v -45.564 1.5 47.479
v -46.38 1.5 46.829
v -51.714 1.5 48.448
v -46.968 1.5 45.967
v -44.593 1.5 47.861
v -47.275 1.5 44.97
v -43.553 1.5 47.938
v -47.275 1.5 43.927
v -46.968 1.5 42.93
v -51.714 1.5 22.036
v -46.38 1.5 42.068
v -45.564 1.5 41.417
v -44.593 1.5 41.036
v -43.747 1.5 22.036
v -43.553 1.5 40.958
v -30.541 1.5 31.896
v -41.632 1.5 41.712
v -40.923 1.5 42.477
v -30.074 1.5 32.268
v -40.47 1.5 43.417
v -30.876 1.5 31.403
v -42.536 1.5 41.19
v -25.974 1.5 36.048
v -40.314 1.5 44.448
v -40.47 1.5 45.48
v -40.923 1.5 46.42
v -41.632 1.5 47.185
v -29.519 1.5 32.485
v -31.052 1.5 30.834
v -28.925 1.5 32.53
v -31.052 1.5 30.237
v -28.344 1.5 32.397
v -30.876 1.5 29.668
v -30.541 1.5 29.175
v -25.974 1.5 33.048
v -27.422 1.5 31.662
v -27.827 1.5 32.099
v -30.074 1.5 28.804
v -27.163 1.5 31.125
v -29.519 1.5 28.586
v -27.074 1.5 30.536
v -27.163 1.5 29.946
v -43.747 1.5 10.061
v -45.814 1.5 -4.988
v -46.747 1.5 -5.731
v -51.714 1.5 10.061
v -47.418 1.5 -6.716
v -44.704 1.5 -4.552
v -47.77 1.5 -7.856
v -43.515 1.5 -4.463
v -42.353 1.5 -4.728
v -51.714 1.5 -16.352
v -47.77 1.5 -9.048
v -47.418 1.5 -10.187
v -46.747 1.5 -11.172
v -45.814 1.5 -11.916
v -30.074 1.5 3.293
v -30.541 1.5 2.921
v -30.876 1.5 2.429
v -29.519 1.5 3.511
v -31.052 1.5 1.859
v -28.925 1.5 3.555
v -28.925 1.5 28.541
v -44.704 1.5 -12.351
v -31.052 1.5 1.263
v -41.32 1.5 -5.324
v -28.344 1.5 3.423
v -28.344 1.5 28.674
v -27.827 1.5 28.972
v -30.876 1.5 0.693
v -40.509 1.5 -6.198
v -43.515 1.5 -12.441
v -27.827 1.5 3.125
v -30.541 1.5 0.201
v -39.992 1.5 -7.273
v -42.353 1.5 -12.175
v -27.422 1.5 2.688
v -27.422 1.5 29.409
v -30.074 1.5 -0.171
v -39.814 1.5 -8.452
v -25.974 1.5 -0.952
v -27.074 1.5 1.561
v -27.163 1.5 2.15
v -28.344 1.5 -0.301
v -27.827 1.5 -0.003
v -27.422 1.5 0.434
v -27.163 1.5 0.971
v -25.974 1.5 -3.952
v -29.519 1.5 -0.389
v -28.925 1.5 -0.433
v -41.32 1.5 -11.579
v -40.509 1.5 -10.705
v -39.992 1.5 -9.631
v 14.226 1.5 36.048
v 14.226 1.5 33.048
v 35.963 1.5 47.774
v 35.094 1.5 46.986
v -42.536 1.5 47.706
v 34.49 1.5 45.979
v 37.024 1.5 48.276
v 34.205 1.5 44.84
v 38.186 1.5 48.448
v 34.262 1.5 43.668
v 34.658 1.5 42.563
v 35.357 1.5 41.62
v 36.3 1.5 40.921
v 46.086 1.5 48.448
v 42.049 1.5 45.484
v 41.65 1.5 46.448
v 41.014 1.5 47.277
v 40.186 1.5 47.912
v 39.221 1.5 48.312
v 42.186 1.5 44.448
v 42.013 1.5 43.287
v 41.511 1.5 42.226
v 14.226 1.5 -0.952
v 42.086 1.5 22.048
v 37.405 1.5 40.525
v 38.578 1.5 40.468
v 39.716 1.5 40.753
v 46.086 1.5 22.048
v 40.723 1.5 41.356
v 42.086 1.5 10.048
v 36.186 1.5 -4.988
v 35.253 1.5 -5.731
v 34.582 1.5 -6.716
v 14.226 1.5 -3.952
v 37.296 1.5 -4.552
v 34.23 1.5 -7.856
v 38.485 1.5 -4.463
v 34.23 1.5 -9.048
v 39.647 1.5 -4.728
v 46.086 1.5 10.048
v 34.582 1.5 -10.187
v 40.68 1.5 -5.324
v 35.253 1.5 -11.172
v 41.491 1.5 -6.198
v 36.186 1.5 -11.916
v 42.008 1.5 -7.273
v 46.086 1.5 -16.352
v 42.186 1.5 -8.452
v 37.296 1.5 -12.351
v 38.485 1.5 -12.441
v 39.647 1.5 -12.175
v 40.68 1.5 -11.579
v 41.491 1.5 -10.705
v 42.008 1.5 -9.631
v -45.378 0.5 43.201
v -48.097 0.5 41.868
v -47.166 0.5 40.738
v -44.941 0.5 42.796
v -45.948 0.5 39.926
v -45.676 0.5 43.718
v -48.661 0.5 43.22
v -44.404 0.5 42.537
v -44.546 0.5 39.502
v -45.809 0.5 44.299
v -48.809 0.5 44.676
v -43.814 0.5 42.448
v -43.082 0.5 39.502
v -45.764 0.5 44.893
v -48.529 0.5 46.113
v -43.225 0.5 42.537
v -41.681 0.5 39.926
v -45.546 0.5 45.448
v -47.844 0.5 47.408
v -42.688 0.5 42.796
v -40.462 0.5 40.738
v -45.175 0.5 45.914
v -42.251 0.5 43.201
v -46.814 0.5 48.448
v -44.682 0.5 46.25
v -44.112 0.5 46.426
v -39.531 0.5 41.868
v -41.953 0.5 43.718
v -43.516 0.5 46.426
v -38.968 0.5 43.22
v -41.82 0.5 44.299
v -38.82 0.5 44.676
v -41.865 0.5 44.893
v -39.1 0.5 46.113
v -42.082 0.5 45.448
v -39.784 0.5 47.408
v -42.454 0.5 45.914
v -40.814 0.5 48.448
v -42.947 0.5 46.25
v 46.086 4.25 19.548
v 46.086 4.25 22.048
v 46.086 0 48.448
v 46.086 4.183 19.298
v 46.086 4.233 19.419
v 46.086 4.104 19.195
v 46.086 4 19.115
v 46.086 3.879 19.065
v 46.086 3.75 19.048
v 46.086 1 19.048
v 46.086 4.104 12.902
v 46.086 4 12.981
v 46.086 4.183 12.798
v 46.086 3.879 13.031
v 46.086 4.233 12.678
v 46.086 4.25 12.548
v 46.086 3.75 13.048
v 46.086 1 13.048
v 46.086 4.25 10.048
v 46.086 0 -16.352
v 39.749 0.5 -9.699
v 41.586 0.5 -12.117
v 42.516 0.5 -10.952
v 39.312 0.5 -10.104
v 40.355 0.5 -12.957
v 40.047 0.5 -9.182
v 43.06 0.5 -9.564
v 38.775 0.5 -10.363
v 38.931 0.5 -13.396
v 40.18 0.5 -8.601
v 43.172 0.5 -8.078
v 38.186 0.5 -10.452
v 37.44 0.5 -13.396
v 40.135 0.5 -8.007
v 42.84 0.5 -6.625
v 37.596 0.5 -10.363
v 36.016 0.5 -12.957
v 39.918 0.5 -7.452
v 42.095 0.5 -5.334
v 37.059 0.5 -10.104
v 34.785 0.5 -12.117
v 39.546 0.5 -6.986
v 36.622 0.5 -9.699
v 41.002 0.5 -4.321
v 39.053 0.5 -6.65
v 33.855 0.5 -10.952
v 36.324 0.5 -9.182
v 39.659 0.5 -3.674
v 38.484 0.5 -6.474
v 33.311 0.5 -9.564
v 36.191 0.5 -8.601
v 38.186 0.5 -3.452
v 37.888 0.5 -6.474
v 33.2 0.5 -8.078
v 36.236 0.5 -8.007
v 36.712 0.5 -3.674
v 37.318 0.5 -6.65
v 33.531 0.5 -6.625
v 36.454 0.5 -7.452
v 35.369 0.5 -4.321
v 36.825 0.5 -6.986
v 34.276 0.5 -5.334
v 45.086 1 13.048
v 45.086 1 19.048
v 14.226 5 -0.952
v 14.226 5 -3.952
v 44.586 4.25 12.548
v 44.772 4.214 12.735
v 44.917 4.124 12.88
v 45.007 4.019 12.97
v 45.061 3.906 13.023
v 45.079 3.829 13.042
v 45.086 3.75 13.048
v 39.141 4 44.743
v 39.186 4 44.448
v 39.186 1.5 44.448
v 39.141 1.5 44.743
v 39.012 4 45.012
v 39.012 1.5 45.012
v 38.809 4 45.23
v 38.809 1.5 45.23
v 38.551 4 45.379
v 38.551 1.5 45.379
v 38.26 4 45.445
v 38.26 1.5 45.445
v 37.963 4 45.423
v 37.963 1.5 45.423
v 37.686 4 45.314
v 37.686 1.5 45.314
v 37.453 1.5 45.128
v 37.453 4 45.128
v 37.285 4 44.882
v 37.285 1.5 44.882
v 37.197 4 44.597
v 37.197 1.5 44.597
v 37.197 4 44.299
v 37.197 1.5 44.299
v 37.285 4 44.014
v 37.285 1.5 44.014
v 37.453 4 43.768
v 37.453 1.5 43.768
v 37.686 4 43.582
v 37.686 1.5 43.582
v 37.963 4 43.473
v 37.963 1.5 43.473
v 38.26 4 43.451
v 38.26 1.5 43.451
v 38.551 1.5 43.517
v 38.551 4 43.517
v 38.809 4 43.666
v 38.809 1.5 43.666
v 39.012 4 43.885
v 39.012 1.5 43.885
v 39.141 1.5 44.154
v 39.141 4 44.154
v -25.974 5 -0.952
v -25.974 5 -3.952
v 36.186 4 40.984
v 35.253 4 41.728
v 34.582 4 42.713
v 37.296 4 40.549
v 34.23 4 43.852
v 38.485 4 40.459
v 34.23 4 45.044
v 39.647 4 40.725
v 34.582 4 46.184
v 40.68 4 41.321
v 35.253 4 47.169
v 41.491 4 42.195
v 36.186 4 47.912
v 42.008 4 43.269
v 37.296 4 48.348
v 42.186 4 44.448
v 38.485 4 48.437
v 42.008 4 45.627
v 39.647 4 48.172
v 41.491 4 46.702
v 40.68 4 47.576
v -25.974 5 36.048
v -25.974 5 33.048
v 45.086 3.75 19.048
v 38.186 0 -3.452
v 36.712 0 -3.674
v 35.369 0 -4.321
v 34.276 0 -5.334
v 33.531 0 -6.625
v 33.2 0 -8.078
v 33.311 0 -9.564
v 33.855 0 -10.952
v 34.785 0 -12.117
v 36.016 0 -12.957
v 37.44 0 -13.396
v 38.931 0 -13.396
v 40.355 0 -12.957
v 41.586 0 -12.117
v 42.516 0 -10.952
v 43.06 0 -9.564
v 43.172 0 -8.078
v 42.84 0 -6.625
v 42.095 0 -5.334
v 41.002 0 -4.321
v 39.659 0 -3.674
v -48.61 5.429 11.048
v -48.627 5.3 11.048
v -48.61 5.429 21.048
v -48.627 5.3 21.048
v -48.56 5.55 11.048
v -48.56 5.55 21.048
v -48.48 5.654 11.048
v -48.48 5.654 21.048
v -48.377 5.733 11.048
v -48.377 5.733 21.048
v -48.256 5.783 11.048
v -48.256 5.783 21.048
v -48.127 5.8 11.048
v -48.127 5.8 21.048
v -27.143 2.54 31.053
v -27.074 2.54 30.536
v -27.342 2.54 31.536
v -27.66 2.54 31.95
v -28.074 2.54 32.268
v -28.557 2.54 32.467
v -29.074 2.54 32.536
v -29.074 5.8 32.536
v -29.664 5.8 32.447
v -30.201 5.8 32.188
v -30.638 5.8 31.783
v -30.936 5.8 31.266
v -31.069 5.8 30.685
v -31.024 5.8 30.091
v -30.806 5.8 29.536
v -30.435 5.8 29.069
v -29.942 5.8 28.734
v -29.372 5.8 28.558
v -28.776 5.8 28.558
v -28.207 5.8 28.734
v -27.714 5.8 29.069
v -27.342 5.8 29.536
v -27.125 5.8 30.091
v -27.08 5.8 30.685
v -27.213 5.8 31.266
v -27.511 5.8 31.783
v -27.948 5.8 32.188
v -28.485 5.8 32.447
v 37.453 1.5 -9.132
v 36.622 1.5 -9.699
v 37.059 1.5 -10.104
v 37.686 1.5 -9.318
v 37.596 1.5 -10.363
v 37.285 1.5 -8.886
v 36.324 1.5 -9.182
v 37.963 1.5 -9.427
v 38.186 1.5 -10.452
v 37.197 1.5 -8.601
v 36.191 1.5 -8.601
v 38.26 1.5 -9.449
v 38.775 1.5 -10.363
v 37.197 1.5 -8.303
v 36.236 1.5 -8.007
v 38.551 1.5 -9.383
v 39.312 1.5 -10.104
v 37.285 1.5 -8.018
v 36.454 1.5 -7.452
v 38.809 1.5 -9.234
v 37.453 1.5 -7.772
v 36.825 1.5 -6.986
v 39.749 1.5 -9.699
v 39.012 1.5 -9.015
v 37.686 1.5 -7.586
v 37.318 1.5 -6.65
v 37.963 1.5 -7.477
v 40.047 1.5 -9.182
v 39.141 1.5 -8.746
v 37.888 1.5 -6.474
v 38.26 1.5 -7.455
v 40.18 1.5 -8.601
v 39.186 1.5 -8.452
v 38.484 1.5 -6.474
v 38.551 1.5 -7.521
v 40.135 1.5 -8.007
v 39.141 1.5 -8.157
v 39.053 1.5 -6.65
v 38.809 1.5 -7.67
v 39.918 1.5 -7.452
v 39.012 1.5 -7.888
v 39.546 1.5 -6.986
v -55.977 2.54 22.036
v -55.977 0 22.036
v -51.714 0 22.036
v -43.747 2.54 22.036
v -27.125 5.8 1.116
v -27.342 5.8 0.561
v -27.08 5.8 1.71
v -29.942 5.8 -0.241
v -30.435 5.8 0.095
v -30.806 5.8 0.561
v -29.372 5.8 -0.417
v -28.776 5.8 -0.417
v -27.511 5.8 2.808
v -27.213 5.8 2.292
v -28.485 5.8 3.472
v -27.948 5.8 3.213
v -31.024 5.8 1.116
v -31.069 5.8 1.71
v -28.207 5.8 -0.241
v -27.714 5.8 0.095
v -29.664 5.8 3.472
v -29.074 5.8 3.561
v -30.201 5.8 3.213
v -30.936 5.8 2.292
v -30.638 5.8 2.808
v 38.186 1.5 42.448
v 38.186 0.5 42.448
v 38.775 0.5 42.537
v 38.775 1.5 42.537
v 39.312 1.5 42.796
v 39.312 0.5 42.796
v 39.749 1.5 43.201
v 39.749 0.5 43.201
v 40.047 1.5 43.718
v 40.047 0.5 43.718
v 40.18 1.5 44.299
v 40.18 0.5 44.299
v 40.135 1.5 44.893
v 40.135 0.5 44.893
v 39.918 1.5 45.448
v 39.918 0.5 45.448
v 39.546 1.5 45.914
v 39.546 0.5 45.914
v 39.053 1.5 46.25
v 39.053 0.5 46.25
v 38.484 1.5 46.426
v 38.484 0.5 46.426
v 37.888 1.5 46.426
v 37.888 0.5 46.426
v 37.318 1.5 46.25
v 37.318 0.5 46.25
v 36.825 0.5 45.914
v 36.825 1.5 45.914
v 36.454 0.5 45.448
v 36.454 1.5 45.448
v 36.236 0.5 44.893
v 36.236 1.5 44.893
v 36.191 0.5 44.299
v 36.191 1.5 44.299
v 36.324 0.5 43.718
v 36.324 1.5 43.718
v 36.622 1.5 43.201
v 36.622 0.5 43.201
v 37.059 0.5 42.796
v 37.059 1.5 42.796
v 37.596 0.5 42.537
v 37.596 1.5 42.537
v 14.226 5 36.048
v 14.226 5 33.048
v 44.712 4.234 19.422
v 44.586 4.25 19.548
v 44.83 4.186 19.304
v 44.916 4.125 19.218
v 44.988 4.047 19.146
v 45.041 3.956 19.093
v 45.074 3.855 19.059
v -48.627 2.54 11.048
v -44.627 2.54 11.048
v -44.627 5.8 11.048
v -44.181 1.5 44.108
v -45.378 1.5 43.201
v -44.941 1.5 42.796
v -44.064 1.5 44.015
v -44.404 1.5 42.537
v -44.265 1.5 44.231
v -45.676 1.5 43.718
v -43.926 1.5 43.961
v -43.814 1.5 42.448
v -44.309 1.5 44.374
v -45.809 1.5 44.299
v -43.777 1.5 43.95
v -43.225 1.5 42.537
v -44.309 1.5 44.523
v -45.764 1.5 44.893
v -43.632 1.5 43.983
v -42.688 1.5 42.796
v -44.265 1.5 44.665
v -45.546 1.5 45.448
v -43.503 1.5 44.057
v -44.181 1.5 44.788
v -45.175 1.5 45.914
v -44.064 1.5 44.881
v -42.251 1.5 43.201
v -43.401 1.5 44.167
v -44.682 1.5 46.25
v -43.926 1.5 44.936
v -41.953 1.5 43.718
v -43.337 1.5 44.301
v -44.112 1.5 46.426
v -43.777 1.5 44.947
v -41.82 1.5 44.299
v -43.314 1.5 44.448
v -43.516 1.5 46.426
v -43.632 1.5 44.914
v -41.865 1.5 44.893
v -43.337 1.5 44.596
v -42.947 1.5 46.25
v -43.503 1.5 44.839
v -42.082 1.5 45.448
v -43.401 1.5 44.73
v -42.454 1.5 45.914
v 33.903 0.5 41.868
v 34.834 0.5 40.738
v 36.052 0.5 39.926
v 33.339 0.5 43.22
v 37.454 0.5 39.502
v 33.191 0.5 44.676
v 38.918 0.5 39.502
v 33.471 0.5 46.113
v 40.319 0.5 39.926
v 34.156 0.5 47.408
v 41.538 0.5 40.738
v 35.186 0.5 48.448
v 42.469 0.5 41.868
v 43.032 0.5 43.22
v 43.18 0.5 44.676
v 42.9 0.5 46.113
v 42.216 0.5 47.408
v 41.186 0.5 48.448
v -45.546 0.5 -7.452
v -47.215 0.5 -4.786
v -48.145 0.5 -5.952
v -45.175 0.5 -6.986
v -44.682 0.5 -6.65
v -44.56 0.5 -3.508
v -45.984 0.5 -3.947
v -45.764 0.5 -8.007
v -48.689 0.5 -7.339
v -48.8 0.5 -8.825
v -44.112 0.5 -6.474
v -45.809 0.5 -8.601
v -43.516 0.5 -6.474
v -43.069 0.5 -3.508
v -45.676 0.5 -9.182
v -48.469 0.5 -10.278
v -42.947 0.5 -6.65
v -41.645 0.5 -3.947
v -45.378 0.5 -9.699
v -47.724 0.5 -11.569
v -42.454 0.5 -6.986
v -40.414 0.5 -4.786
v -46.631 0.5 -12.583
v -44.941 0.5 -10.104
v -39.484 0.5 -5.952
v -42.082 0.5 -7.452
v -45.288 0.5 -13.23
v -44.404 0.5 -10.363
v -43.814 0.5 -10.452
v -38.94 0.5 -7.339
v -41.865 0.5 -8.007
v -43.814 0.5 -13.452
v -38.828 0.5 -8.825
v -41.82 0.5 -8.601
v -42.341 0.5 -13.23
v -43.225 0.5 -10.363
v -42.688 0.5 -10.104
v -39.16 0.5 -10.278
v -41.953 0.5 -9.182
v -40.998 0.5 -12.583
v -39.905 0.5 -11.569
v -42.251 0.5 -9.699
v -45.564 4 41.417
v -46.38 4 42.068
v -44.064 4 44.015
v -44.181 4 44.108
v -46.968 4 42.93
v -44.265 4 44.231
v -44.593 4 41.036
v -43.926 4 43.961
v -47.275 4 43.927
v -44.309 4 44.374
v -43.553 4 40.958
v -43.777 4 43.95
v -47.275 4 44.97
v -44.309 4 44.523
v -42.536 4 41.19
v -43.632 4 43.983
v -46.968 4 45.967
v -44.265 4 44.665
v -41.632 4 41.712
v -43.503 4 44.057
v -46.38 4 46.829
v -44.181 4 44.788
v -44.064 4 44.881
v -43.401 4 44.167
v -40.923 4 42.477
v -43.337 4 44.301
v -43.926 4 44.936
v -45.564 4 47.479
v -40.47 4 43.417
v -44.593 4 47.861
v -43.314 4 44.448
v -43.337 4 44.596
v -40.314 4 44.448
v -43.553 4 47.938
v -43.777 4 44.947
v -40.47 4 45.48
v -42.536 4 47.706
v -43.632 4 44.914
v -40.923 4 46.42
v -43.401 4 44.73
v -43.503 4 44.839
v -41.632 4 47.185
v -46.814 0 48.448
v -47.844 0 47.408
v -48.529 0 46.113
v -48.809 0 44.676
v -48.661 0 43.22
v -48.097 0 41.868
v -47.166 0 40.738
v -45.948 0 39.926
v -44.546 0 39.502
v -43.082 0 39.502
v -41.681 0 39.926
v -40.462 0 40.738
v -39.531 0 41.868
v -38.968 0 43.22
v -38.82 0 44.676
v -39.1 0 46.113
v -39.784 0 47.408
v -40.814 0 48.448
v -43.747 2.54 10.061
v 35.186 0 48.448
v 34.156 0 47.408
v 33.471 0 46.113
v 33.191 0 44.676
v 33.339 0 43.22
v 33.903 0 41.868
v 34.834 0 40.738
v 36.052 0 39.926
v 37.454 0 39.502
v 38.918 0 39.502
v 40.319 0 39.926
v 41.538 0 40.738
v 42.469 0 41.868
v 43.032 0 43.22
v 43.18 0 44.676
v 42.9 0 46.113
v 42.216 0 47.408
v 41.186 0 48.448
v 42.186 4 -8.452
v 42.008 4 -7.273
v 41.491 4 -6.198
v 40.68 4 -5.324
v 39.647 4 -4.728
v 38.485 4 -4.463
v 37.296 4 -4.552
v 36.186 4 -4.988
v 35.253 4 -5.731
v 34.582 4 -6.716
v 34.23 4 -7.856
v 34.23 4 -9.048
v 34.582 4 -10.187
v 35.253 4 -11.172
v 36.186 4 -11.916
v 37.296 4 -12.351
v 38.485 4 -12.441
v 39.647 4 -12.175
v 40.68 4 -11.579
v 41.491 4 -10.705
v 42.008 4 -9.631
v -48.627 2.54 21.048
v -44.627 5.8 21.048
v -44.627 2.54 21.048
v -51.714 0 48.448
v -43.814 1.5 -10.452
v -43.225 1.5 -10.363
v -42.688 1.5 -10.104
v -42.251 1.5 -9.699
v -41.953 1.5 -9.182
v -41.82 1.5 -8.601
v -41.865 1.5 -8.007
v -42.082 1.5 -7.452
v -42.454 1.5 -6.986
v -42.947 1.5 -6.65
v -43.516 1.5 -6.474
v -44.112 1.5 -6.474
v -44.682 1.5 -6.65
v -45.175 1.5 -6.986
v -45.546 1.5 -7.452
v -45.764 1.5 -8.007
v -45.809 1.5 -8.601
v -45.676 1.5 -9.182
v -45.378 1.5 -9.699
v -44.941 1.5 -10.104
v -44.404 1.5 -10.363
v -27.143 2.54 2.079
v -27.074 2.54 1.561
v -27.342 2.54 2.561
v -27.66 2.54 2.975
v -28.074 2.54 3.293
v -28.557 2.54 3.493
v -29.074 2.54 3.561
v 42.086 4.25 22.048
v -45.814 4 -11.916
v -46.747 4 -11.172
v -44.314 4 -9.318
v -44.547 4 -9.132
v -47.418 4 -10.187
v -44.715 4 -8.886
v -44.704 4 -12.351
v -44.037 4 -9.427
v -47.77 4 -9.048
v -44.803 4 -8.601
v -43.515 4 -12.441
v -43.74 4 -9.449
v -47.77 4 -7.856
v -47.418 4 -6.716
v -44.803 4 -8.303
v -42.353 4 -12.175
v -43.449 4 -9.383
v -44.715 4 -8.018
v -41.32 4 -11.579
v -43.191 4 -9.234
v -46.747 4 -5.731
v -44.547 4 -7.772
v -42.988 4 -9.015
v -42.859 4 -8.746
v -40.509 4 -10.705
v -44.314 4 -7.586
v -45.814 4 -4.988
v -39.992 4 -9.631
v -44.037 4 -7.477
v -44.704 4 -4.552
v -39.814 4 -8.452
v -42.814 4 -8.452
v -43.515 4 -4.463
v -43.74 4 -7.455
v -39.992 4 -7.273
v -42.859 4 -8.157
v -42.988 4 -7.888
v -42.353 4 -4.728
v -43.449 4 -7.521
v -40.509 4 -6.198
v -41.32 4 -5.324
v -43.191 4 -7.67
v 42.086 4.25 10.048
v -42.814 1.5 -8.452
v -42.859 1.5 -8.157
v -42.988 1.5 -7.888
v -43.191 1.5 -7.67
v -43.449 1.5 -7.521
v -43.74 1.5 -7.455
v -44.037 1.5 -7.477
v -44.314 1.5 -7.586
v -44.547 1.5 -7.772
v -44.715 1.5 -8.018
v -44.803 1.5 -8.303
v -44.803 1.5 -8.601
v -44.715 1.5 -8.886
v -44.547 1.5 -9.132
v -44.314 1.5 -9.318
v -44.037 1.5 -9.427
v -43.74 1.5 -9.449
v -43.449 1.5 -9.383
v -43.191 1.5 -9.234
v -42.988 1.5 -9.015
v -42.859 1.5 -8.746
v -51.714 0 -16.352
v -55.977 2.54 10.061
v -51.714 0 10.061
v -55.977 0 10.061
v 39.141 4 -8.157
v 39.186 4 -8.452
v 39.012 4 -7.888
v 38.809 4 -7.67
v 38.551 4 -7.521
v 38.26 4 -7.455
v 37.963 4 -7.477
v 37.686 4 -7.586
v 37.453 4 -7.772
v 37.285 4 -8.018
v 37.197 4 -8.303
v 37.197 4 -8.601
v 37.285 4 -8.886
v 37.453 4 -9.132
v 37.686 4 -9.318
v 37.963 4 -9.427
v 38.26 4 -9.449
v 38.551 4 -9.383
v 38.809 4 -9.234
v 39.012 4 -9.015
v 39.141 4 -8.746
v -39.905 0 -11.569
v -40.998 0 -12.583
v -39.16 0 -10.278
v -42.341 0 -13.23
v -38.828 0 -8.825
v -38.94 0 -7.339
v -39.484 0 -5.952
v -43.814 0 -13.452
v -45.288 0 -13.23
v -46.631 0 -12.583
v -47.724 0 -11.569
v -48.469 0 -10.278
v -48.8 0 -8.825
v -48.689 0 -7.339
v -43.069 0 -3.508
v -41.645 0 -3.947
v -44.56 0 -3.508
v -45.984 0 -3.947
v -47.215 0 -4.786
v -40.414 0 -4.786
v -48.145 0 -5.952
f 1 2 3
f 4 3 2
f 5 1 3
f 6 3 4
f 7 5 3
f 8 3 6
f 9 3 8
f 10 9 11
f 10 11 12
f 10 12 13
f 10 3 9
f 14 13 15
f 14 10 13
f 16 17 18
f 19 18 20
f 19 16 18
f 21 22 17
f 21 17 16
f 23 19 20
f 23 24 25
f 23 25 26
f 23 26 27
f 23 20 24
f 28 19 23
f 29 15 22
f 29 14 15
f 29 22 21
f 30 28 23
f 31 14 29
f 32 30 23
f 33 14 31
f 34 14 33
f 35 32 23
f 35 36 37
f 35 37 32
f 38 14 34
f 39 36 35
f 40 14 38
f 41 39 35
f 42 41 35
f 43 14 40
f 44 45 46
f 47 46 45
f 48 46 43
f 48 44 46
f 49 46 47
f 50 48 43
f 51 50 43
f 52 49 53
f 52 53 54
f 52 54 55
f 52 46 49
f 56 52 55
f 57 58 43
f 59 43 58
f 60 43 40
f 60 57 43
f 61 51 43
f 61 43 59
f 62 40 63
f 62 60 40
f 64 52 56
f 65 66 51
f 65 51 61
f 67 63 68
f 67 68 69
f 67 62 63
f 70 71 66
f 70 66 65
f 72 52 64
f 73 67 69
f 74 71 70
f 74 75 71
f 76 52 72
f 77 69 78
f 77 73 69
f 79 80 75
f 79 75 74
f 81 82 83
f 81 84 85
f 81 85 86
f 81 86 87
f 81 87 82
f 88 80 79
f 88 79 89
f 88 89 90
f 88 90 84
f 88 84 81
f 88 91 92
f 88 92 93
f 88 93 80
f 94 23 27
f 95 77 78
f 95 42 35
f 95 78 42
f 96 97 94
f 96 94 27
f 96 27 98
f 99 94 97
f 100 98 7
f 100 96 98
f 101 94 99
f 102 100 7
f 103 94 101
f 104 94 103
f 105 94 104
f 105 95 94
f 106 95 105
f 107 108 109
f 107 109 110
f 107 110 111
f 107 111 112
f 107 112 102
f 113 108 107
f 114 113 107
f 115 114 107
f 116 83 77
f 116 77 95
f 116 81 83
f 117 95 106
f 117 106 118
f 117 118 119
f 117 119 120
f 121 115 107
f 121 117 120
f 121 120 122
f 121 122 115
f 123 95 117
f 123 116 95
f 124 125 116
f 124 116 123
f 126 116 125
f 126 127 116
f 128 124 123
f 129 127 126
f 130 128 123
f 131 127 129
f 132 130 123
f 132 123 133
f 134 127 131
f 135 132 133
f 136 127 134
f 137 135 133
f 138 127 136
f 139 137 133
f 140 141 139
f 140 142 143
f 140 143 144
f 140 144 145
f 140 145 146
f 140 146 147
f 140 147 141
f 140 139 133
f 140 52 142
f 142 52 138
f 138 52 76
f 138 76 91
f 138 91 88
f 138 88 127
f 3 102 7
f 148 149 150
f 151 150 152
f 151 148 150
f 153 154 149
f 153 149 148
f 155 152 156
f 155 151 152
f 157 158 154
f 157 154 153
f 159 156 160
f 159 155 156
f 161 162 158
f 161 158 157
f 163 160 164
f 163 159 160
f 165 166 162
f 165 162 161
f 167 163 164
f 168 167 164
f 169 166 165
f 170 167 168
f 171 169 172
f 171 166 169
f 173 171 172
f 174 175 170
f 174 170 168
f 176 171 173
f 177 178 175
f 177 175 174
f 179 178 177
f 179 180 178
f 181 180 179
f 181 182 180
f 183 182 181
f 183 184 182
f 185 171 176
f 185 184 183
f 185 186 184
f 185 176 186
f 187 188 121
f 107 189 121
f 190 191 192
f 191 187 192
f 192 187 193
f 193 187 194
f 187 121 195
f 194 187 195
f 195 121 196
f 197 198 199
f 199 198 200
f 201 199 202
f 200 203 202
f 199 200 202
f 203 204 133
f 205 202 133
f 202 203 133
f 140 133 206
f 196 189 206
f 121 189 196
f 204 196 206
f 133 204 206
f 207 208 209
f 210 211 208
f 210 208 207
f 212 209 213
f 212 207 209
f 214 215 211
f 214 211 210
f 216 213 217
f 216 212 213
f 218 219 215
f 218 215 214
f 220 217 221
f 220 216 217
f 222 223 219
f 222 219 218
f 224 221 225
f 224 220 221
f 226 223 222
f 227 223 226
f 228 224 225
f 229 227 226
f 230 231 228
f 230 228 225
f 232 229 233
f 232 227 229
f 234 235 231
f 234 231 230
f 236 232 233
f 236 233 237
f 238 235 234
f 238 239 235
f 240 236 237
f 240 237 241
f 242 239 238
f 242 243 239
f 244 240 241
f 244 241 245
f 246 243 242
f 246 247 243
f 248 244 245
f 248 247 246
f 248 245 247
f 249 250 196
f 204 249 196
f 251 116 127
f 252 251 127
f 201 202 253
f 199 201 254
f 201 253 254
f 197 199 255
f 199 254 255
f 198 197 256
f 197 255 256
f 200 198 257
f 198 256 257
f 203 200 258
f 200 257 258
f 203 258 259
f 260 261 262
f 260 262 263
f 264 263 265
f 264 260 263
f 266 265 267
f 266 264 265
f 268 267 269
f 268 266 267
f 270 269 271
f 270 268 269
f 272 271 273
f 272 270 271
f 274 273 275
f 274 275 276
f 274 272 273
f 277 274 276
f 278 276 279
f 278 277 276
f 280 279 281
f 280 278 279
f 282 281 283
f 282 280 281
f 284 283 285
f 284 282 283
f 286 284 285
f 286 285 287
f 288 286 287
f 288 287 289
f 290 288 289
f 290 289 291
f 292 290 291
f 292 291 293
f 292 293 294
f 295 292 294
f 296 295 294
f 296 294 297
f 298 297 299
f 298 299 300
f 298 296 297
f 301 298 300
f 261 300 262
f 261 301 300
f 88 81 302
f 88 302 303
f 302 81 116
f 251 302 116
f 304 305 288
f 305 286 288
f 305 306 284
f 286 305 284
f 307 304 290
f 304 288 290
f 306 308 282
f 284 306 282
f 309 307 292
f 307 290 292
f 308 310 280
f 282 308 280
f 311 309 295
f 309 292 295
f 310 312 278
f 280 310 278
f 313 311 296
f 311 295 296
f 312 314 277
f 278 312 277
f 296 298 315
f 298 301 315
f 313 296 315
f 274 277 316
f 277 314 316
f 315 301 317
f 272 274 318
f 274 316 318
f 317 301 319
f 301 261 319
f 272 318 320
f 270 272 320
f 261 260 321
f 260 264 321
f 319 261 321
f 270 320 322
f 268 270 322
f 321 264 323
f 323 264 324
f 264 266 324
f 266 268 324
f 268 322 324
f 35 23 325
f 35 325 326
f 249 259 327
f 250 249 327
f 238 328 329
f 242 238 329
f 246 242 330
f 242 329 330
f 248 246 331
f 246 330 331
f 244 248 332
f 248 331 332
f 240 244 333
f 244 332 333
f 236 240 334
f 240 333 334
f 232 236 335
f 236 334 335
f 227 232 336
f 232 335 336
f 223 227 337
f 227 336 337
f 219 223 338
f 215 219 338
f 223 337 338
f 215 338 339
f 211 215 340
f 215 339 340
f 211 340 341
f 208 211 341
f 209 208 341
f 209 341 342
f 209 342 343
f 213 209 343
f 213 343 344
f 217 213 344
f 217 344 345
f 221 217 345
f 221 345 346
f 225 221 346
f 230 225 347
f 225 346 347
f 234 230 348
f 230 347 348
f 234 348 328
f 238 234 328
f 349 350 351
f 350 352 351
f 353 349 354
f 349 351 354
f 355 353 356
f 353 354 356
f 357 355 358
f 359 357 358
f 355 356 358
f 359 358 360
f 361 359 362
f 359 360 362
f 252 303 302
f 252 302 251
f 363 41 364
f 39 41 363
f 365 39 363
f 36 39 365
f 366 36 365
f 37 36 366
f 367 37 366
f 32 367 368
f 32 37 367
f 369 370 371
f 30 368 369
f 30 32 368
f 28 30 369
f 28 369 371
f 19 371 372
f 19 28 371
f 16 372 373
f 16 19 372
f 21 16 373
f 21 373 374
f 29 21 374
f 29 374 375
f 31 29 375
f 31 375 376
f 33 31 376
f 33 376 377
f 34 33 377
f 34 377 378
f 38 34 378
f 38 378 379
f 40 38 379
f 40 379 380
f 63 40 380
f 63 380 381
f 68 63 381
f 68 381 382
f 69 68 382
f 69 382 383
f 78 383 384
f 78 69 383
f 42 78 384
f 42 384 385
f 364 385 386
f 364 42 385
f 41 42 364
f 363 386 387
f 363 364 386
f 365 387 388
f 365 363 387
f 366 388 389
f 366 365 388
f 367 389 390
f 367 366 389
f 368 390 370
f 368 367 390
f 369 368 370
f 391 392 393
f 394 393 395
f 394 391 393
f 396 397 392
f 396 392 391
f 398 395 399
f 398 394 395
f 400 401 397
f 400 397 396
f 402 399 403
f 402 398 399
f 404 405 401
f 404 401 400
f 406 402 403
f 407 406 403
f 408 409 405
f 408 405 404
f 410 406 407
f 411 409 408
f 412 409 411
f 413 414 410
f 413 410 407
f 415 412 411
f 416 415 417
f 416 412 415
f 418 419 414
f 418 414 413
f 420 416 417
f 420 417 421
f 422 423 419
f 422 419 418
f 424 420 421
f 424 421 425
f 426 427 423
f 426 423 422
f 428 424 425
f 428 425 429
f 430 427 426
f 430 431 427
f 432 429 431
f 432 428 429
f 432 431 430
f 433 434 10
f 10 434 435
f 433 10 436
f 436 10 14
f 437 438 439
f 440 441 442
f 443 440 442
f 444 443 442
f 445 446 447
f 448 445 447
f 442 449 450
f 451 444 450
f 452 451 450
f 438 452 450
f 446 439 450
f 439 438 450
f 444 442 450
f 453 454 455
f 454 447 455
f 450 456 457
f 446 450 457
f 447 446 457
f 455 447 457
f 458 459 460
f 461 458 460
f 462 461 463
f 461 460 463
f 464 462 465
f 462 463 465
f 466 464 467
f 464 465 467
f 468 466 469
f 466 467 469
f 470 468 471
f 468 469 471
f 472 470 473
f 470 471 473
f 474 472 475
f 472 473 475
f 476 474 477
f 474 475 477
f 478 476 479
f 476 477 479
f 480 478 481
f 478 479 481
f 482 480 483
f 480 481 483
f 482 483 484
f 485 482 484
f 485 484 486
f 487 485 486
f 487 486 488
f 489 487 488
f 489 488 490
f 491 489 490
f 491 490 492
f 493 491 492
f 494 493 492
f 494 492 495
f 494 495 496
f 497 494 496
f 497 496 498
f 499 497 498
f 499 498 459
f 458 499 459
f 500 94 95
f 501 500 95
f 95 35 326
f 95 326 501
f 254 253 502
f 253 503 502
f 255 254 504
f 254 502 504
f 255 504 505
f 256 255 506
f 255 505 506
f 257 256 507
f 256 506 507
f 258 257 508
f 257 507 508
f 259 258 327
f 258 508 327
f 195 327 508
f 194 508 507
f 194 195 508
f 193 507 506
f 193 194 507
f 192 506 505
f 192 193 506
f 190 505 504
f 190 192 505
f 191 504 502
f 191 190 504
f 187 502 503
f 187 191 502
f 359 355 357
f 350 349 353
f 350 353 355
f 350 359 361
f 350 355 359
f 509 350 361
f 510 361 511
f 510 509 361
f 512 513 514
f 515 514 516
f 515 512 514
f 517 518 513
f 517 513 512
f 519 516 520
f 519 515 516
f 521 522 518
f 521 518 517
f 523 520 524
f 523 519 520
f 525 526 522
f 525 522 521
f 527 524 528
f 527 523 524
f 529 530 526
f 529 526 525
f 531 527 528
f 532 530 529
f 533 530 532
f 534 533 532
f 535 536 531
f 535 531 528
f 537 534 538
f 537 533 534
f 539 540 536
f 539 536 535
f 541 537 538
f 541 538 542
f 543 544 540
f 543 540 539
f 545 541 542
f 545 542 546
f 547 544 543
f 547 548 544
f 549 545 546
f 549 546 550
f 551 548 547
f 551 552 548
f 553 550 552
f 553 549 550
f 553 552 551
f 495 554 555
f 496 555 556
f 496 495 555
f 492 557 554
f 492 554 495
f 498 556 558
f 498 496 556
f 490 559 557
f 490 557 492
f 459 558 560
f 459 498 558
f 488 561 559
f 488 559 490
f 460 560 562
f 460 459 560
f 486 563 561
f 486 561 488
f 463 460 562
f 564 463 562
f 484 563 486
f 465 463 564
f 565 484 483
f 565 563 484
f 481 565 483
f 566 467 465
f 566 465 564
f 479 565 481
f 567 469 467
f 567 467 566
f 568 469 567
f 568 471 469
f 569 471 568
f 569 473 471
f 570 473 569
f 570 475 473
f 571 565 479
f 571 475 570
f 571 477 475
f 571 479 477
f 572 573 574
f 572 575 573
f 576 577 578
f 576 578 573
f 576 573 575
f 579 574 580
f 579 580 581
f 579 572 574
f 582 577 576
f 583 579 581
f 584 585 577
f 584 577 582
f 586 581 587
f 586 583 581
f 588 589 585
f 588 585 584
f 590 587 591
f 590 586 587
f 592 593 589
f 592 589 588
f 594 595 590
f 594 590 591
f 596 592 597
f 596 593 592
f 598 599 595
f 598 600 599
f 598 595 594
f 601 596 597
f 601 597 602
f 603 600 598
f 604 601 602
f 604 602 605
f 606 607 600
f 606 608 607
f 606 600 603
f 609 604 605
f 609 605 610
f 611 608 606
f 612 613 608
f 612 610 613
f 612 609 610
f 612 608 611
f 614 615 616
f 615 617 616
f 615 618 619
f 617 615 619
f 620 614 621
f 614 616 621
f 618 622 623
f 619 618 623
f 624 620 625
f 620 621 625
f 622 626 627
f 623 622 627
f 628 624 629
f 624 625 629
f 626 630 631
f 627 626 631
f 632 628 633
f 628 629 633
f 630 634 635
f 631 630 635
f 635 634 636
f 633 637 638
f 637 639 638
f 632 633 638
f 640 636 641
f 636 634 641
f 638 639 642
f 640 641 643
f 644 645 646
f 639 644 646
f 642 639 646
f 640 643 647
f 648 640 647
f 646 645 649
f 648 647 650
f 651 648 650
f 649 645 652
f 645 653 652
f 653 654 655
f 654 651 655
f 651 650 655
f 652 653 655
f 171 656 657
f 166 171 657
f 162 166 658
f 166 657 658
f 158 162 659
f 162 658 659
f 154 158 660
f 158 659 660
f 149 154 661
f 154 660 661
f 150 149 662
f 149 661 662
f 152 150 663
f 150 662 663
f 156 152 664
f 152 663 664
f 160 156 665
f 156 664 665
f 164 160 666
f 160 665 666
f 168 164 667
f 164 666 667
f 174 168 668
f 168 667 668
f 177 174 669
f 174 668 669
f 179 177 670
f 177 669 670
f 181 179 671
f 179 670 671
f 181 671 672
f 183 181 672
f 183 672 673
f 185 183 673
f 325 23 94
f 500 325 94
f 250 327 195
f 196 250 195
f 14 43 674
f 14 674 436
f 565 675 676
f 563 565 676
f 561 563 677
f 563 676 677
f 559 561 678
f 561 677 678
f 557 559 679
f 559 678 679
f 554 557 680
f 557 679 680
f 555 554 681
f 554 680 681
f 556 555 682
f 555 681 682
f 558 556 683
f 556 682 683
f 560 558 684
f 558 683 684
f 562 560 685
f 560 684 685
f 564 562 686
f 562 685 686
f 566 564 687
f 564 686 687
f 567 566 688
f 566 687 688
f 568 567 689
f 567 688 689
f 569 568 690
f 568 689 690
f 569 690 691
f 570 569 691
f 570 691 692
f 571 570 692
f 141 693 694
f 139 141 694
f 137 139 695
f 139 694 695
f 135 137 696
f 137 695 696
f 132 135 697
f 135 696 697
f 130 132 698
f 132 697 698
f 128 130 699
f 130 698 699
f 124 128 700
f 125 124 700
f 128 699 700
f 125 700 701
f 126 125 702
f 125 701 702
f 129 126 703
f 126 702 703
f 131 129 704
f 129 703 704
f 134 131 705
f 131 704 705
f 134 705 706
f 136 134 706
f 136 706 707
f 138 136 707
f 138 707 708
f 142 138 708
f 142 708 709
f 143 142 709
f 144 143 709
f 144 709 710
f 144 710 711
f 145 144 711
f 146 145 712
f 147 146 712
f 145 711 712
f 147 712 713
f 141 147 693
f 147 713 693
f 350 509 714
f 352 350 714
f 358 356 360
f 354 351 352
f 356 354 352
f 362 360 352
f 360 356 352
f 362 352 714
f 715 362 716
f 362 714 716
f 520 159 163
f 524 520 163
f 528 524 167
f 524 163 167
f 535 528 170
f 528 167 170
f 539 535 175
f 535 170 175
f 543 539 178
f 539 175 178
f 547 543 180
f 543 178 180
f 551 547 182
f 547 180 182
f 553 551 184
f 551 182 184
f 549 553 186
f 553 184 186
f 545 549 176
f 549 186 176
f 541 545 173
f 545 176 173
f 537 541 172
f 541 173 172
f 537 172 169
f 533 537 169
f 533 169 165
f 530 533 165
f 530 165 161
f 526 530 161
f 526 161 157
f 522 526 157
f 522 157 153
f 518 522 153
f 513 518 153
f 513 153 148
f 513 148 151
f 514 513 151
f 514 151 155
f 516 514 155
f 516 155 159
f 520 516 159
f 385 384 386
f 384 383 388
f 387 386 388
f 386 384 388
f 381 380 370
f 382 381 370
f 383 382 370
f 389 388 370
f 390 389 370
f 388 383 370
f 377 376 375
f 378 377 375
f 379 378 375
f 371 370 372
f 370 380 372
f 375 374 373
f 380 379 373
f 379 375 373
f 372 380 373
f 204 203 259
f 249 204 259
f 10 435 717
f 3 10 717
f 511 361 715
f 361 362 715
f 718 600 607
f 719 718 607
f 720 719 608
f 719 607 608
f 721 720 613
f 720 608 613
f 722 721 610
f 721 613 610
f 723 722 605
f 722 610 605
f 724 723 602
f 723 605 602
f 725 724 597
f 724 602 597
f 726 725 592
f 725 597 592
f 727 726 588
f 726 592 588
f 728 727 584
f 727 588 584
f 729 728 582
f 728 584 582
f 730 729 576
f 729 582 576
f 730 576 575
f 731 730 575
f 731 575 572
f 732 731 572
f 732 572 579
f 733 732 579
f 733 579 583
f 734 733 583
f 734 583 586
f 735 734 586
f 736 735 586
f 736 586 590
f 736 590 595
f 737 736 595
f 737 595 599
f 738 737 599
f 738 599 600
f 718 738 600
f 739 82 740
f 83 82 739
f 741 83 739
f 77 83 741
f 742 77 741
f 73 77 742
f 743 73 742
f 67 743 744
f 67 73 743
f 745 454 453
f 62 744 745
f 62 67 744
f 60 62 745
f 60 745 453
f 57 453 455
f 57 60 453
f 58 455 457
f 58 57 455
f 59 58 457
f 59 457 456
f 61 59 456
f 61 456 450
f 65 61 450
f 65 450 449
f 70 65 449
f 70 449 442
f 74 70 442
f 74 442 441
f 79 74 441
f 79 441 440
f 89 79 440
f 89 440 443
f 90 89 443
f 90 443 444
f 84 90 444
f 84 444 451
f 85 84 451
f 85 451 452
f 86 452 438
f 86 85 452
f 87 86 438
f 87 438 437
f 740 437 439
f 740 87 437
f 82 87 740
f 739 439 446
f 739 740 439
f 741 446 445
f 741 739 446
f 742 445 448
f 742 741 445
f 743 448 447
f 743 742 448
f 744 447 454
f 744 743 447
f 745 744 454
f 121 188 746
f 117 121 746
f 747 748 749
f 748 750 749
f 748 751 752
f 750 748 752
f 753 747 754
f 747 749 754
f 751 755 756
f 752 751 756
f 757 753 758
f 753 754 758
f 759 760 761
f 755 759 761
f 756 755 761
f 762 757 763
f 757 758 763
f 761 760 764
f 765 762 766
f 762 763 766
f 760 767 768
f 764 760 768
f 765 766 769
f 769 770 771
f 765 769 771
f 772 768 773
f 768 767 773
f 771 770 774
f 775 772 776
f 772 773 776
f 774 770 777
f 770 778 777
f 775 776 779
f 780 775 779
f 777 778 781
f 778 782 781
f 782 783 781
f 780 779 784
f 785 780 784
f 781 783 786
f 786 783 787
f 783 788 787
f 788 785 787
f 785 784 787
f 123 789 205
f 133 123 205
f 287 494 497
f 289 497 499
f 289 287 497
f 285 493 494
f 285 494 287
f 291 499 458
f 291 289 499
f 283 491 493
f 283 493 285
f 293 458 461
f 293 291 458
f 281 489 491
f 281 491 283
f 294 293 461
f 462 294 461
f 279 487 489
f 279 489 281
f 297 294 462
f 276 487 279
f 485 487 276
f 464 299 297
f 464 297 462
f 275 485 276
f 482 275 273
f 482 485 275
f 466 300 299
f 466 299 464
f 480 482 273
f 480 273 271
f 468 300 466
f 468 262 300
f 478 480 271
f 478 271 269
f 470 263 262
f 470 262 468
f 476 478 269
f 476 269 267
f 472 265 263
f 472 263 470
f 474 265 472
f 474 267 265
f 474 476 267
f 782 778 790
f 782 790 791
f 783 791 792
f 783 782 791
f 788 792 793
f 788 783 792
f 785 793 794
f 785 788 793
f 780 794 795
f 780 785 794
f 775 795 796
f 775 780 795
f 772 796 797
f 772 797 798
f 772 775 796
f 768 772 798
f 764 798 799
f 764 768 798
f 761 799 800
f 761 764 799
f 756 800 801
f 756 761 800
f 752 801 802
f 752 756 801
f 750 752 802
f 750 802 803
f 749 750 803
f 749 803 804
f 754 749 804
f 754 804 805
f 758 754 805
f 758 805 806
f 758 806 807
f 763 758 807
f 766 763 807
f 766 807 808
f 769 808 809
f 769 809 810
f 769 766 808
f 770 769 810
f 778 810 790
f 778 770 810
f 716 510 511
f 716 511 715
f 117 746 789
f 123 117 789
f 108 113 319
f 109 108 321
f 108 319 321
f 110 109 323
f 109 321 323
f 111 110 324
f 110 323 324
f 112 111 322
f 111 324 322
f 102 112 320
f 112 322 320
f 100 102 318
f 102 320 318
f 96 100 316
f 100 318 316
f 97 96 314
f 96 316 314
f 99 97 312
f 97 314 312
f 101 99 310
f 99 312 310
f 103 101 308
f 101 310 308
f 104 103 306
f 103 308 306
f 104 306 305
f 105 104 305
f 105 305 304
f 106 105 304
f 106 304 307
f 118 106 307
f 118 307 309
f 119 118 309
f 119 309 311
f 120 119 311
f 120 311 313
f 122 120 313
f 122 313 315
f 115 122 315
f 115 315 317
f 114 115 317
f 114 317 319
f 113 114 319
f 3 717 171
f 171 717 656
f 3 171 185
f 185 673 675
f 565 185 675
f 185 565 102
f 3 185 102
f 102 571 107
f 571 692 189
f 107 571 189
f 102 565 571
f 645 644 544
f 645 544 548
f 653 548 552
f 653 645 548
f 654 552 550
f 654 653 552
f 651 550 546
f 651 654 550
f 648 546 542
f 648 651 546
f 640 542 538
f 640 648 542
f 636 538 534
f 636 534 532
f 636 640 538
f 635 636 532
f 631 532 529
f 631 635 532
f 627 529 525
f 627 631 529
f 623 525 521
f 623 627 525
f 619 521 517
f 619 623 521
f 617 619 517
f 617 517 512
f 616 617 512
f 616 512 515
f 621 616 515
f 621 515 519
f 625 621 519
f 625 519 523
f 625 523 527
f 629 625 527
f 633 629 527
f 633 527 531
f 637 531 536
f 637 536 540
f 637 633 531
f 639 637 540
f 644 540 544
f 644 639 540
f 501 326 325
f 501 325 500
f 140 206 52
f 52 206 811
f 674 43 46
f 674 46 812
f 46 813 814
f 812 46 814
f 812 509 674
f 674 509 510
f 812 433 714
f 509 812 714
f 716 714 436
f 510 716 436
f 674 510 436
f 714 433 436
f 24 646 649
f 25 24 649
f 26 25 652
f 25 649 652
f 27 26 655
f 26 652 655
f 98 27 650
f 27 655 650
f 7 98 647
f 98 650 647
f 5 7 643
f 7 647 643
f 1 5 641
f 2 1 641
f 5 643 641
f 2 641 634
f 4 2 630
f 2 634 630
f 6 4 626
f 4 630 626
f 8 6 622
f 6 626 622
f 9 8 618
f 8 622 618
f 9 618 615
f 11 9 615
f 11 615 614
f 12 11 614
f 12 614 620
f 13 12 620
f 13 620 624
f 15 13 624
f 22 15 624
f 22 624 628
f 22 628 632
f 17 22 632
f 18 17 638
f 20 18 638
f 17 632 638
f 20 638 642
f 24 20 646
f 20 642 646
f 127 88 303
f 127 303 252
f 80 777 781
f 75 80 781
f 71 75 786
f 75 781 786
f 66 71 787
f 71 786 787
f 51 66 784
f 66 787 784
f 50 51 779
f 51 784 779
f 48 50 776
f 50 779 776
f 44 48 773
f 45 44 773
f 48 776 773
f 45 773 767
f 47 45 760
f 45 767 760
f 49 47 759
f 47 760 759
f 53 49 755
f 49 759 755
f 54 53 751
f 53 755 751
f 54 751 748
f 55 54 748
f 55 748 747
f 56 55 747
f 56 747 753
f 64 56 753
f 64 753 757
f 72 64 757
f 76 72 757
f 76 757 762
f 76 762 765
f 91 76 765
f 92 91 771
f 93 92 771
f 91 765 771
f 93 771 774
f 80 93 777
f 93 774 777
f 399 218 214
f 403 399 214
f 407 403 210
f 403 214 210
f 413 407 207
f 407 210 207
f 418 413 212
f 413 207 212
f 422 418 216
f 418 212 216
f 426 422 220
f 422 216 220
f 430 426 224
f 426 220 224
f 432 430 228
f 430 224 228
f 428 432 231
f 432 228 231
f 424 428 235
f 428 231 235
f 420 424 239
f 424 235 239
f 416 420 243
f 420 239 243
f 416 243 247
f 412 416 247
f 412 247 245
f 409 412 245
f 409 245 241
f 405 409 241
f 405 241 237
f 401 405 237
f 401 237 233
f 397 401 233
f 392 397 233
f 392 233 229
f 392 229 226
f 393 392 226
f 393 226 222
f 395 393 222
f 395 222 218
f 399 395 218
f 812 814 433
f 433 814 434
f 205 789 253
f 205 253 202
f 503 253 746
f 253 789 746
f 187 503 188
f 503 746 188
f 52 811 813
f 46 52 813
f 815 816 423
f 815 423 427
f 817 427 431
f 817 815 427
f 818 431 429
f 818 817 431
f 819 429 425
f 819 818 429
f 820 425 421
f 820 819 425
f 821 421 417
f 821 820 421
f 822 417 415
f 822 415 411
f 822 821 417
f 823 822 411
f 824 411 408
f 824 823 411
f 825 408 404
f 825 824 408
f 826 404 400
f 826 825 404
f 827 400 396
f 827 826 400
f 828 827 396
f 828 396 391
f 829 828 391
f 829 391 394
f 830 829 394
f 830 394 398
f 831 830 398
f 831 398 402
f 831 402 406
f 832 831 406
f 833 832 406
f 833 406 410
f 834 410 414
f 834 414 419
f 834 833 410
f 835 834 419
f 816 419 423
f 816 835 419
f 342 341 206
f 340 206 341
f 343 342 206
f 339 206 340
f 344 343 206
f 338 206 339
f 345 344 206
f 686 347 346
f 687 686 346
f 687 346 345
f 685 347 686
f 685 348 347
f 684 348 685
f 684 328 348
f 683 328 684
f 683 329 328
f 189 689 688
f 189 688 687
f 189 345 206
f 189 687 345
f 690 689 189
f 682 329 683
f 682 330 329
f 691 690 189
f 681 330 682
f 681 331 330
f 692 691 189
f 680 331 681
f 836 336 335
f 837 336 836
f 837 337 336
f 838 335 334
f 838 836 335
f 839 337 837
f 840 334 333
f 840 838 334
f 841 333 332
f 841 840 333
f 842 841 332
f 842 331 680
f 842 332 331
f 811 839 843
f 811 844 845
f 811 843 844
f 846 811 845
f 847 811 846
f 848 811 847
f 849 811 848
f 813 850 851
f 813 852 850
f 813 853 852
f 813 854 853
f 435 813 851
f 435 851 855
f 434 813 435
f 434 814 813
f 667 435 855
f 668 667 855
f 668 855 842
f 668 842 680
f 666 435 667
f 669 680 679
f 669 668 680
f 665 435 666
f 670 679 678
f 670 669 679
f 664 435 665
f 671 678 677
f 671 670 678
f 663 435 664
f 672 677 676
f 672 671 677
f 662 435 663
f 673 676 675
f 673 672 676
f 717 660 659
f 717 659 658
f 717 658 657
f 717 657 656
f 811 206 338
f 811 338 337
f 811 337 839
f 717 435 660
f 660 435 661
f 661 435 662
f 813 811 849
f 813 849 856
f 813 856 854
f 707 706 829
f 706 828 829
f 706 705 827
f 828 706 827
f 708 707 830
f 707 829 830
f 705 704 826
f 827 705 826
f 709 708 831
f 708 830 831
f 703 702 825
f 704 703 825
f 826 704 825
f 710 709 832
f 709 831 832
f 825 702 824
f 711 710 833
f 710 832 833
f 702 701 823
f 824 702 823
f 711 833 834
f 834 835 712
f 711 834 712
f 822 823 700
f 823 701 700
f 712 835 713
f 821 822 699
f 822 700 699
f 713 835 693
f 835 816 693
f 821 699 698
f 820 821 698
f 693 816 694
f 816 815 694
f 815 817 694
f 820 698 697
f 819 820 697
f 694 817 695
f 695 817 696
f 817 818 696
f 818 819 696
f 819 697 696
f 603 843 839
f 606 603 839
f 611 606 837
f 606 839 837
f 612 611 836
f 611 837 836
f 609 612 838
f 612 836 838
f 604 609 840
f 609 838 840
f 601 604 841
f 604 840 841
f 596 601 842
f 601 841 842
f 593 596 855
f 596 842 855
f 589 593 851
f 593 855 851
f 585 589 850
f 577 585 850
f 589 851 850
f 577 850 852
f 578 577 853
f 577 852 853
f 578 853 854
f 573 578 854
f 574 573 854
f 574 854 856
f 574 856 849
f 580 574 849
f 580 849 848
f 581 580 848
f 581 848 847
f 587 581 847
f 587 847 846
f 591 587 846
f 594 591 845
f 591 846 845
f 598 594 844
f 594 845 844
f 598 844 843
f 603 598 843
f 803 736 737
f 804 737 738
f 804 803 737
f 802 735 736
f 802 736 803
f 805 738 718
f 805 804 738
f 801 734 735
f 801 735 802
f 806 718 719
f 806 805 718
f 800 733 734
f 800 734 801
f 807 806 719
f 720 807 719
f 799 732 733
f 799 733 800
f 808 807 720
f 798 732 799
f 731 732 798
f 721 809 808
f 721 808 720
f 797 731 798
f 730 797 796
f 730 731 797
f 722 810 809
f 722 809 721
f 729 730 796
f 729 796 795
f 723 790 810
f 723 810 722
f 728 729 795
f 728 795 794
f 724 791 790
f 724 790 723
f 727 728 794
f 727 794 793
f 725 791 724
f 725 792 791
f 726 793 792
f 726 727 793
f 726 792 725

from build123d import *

# Parameters (mm, degrees)
EXTRUDE_1_DEPTH     = 1.5
SKETCH_2_R          = 5
CUT_EXTRUDE_1_DEPTH = 0.5
SKETCH_11_R         = 2
SKETCH_11_W         = 12.230000074
SKETCH_11_H         = 11.97459995
EXTRUDE_5_DEPTH     = 2.539974634
SKETCH_13_R         = 2
SKETCH_13_W         = 4
SKETCH_13_H         = 10
TYPEC_2_DEPTH       = 5.7999746
LED_3_START         = -4.25
LED_3_DEPTH         = 2.75
LED_1_R             = 0.5
CUT_EXTRUDE_2_REACH = 76.258
SKETCH_15_R         = 2
EXTRUDE_START       = -4
SKETCH_16_R         = 4
SKETCH_16_R_2       = 1
SKETCH_16_R_3       = 3.5
SKETCH_16_R_4       = 0.5
EXTRUDE_4_DEPTH     = 2.5
LED_2_START         = -1.5
SKETCH_17_W         = 1
SKETCH_17_H         = 6
LED_2_DEPTH         = 0.5
SKETCH_18_W         = 40.2
SKETCH_18_H         = 3
EXTRUDE_2_DEPTH     = 3.5


with BuildPart() as part:
    # 草图1 → 凸台-拉伸1 (new body)
    with BuildSketch(Plane(origin=(0, 0, 0), x_dir=(1, 0, 0), z_dir=(0, 1, 0))):
        Polygon((-51.714401711, -10.060969859), (-55.976720774, -10.060969859), (-55.976720774, -22.035569809), (-51.714401711, -22.035569809), (-51.714401711, -48.448269834), (46.085598289, -48.448269834), (46.085598289, 16.351730166), (-51.714401711, 16.351730166), align=None)
    extrude(amount=EXTRUDE_1_DEPTH)

    # 草图2 → 防滑切除-拉伸1 (cut)
    with BuildSketch(Plane.XZ):
        with Locations((-43.814401711, 44.448269834)):
            Circle(SKETCH_2_R)
        with Locations((38.185598289, 44.448269834)):
            Circle(SKETCH_2_R)
        with Locations(Location((38.185598289, -8.451730166, 0), (0, 0, 90))):
            Circle(SKETCH_2_R)
        with Locations(Location((-43.814401711, -8.451730166, 0), (0, 0, 270))):
            Circle(SKETCH_2_R)
    extrude(amount=-CUT_EXTRUDE_1_DEPTH, mode=Mode.SUBTRACT)

    # 草图11 → 充电板档板凸台-拉伸5 (add)
    with BuildSketch(Plane.XZ):
        with Locations((-29.074401711, 30.535569809)):
            Circle(SKETCH_11_R)
        with Locations((-29.074401711, 1.560969859)):
            Circle(SKETCH_11_R)
        with Locations((-49.861720737, 16.048269834)):
            Rectangle(SKETCH_11_W, SKETCH_11_H)
    extrude(amount=-EXTRUDE_5_DEPTH)

    # 草图13 → TypeC支撑凸台-拉伸2 (add)
    with BuildSketch(Plane.XZ):
        with Locations(Location((-29.074401711, 30.535569809, 0), (0, 0, 90))):
            Circle(SKETCH_13_R)
        with Locations(Location((-29.074401711, 1.560969859, 0), (0, 0, 90))):
            Circle(SKETCH_13_R)
        with Locations((-46.6267207, 16.048269834)):
            Rectangle(SKETCH_13_W, SKETCH_13_H)
    extrude(amount=-TYPEC_2_DEPTH)

    # 草图14 → LED限位凸台-拉伸3 (add)
    with BuildSketch(Plane.XZ.offset(LED_3_START)):
        Polygon((45.085598289, 13.048269834), (45.085598289, 19.048269834), (46.085598289, 19.048269834), (46.085598289, 22.048269834), (42.085598289, 22.048269834), (42.085598289, 10.048269834), (46.085598289, 10.048269834), (46.085598289, 13.048269834), align=None)
    extrude(amount=LED_3_DEPTH)

    # LED限位圆角1
    led_1_edges = [part.edges().sort_by_distance(p)[0] for p in [
        (-48.6267207, 5.7999746, 16.048269834),
        (45.585598289, 4.25, 19.048269834),
        (45.585598289, 4.25, 13.048269834),
        (45.085598289, 4.25, 16.048269834),
    ]]
    fillet(led_1_edges, radius=LED_1_R)

    # 草图15 → 螺丝孔位切除-拉伸2 (cut, up to next)
    with BuildSketch(Plane.XZ, mode=Mode.PRIVATE) as cut_extrude_2_sk1:
        with Locations(Location((-43.814401711, -8.451730166, 0), (0, 0, 270))):
            Circle(SKETCH_15_R)
    cut_extrude_2_tool1 = extrude(cut_extrude_2_sk1.sketch, amount=-CUT_EXTRUDE_2_REACH, mode=Mode.PRIVATE) & part.part
    # 草图15 → 螺丝孔位切除-拉伸2 (cut, up to next)
    with BuildSketch(Plane.XZ, mode=Mode.PRIVATE) as cut_extrude_2_sk2:
        with Locations(Location((-43.814401711, 44.448269834, 0), (0, 0, 270))):
            Circle(SKETCH_15_R)
    cut_extrude_2_tool2 = extrude(cut_extrude_2_sk2.sketch, amount=-CUT_EXTRUDE_2_REACH, mode=Mode.PRIVATE) & part.part
    # 草图15 → 螺丝孔位切除-拉伸2 (cut, up to next)
    with BuildSketch(Plane.XZ, mode=Mode.PRIVATE) as cut_extrude_2_sk3:
        with Locations(Location((38.185598289, -8.451730166, 0), (0, 0, 270))):
            Circle(SKETCH_15_R)
    cut_extrude_2_tool3 = extrude(cut_extrude_2_sk3.sketch, amount=-CUT_EXTRUDE_2_REACH, mode=Mode.PRIVATE) & part.part
    # 草图15 → 螺丝孔位切除-拉伸2 (cut, up to next)
    with BuildSketch(Plane.XZ, mode=Mode.PRIVATE) as cut_extrude_2_sk4:
        with Locations(Location((38.185598289, 44.448269834, 0), (0, 0, 270))):
            Circle(SKETCH_15_R)
    cut_extrude_2_tool4 = extrude(cut_extrude_2_sk4.sketch, amount=-CUT_EXTRUDE_2_REACH, mode=Mode.PRIVATE) & part.part
    add(cut_extrude_2_tool1.solids().sort_by_distance((-43.814402, 0, -8.45173))[0], mode=Mode.SUBTRACT)
    add(cut_extrude_2_tool2.solids().sort_by_distance((-43.814402, 0, 44.44827))[0], mode=Mode.SUBTRACT)
    add(cut_extrude_2_tool3.solids().sort_by_distance((38.185598, 0, -8.45173))[0], mode=Mode.SUBTRACT)
    add(cut_extrude_2_tool4.solids().sort_by_distance((38.185598, 0, 44.44827))[0], mode=Mode.SUBTRACT)

    # 草图16 → 螺丝孔凸台-拉伸4 (add)
    # profile 1 of 4: a face of its own
    with BuildSketch(Plane.XZ.offset(EXTRUDE_START)):
        with Locations((38.185598289, -8.451730166)):
            Circle(SKETCH_16_R)
        with Locations((38.185598289, -8.451730166)):
            Circle(SKETCH_16_R_2, mode=Mode.SUBTRACT)
    # profile 2 of 4: a face of its own
    with BuildSketch(Plane.XZ.offset(EXTRUDE_START)):
        with Locations((38.185598289, 44.448269834)):
            Circle(SKETCH_16_R)
        with Locations((38.185598289, 44.448269834)):
            Circle(SKETCH_16_R_2, mode=Mode.SUBTRACT)
    # profile 3 of 4: a face of its own
    with BuildSketch(Plane.XZ.offset(EXTRUDE_START)):
        with Locations((-43.814401711, -8.451730166)):
            Circle(SKETCH_16_R)
        with Locations((-43.814401711, -8.451730166)):
            Circle(SKETCH_16_R_2, mode=Mode.SUBTRACT)
    # profile 4 of 4: a face of its own
    with BuildSketch(Plane.XZ.offset(EXTRUDE_START)):
        with Locations((-43.814401711, 44.448269834)):
            Circle(SKETCH_16_R_3)
        with Locations((-43.814401711, 44.448269834)):
            Circle(SKETCH_16_R_4, mode=Mode.SUBTRACT)
    extrude(amount=EXTRUDE_4_DEPTH)

    # 草图17 → LED灯嵌入切除-拉伸2 (cut)
    with BuildSketch(Plane.XZ.offset(LED_2_START)):
        with Locations((45.585598289, 16.048269834)):
            Rectangle(SKETCH_17_W, SKETCH_17_H)
    extrude(amount=LED_2_DEPTH, mode=Mode.SUBTRACT)

    # 草图18 → 散热板支撑凸台-拉伸2 (add)
    with BuildSketch(Plane(origin=(0, 1.5, 0), x_dir=(1, 0, 0), z_dir=(0, 1, 0))):
        with Locations((-5.874401711, 2.451730166)):
            Rectangle(SKETCH_18_W, SKETCH_18_H)
        with Locations((-5.874401711, -34.548269834)):
            Rectangle(SKETCH_18_W, SKETCH_18_H)
    extrude(amount=EXTRUDE_2_DEPTH)


solid = part.part
